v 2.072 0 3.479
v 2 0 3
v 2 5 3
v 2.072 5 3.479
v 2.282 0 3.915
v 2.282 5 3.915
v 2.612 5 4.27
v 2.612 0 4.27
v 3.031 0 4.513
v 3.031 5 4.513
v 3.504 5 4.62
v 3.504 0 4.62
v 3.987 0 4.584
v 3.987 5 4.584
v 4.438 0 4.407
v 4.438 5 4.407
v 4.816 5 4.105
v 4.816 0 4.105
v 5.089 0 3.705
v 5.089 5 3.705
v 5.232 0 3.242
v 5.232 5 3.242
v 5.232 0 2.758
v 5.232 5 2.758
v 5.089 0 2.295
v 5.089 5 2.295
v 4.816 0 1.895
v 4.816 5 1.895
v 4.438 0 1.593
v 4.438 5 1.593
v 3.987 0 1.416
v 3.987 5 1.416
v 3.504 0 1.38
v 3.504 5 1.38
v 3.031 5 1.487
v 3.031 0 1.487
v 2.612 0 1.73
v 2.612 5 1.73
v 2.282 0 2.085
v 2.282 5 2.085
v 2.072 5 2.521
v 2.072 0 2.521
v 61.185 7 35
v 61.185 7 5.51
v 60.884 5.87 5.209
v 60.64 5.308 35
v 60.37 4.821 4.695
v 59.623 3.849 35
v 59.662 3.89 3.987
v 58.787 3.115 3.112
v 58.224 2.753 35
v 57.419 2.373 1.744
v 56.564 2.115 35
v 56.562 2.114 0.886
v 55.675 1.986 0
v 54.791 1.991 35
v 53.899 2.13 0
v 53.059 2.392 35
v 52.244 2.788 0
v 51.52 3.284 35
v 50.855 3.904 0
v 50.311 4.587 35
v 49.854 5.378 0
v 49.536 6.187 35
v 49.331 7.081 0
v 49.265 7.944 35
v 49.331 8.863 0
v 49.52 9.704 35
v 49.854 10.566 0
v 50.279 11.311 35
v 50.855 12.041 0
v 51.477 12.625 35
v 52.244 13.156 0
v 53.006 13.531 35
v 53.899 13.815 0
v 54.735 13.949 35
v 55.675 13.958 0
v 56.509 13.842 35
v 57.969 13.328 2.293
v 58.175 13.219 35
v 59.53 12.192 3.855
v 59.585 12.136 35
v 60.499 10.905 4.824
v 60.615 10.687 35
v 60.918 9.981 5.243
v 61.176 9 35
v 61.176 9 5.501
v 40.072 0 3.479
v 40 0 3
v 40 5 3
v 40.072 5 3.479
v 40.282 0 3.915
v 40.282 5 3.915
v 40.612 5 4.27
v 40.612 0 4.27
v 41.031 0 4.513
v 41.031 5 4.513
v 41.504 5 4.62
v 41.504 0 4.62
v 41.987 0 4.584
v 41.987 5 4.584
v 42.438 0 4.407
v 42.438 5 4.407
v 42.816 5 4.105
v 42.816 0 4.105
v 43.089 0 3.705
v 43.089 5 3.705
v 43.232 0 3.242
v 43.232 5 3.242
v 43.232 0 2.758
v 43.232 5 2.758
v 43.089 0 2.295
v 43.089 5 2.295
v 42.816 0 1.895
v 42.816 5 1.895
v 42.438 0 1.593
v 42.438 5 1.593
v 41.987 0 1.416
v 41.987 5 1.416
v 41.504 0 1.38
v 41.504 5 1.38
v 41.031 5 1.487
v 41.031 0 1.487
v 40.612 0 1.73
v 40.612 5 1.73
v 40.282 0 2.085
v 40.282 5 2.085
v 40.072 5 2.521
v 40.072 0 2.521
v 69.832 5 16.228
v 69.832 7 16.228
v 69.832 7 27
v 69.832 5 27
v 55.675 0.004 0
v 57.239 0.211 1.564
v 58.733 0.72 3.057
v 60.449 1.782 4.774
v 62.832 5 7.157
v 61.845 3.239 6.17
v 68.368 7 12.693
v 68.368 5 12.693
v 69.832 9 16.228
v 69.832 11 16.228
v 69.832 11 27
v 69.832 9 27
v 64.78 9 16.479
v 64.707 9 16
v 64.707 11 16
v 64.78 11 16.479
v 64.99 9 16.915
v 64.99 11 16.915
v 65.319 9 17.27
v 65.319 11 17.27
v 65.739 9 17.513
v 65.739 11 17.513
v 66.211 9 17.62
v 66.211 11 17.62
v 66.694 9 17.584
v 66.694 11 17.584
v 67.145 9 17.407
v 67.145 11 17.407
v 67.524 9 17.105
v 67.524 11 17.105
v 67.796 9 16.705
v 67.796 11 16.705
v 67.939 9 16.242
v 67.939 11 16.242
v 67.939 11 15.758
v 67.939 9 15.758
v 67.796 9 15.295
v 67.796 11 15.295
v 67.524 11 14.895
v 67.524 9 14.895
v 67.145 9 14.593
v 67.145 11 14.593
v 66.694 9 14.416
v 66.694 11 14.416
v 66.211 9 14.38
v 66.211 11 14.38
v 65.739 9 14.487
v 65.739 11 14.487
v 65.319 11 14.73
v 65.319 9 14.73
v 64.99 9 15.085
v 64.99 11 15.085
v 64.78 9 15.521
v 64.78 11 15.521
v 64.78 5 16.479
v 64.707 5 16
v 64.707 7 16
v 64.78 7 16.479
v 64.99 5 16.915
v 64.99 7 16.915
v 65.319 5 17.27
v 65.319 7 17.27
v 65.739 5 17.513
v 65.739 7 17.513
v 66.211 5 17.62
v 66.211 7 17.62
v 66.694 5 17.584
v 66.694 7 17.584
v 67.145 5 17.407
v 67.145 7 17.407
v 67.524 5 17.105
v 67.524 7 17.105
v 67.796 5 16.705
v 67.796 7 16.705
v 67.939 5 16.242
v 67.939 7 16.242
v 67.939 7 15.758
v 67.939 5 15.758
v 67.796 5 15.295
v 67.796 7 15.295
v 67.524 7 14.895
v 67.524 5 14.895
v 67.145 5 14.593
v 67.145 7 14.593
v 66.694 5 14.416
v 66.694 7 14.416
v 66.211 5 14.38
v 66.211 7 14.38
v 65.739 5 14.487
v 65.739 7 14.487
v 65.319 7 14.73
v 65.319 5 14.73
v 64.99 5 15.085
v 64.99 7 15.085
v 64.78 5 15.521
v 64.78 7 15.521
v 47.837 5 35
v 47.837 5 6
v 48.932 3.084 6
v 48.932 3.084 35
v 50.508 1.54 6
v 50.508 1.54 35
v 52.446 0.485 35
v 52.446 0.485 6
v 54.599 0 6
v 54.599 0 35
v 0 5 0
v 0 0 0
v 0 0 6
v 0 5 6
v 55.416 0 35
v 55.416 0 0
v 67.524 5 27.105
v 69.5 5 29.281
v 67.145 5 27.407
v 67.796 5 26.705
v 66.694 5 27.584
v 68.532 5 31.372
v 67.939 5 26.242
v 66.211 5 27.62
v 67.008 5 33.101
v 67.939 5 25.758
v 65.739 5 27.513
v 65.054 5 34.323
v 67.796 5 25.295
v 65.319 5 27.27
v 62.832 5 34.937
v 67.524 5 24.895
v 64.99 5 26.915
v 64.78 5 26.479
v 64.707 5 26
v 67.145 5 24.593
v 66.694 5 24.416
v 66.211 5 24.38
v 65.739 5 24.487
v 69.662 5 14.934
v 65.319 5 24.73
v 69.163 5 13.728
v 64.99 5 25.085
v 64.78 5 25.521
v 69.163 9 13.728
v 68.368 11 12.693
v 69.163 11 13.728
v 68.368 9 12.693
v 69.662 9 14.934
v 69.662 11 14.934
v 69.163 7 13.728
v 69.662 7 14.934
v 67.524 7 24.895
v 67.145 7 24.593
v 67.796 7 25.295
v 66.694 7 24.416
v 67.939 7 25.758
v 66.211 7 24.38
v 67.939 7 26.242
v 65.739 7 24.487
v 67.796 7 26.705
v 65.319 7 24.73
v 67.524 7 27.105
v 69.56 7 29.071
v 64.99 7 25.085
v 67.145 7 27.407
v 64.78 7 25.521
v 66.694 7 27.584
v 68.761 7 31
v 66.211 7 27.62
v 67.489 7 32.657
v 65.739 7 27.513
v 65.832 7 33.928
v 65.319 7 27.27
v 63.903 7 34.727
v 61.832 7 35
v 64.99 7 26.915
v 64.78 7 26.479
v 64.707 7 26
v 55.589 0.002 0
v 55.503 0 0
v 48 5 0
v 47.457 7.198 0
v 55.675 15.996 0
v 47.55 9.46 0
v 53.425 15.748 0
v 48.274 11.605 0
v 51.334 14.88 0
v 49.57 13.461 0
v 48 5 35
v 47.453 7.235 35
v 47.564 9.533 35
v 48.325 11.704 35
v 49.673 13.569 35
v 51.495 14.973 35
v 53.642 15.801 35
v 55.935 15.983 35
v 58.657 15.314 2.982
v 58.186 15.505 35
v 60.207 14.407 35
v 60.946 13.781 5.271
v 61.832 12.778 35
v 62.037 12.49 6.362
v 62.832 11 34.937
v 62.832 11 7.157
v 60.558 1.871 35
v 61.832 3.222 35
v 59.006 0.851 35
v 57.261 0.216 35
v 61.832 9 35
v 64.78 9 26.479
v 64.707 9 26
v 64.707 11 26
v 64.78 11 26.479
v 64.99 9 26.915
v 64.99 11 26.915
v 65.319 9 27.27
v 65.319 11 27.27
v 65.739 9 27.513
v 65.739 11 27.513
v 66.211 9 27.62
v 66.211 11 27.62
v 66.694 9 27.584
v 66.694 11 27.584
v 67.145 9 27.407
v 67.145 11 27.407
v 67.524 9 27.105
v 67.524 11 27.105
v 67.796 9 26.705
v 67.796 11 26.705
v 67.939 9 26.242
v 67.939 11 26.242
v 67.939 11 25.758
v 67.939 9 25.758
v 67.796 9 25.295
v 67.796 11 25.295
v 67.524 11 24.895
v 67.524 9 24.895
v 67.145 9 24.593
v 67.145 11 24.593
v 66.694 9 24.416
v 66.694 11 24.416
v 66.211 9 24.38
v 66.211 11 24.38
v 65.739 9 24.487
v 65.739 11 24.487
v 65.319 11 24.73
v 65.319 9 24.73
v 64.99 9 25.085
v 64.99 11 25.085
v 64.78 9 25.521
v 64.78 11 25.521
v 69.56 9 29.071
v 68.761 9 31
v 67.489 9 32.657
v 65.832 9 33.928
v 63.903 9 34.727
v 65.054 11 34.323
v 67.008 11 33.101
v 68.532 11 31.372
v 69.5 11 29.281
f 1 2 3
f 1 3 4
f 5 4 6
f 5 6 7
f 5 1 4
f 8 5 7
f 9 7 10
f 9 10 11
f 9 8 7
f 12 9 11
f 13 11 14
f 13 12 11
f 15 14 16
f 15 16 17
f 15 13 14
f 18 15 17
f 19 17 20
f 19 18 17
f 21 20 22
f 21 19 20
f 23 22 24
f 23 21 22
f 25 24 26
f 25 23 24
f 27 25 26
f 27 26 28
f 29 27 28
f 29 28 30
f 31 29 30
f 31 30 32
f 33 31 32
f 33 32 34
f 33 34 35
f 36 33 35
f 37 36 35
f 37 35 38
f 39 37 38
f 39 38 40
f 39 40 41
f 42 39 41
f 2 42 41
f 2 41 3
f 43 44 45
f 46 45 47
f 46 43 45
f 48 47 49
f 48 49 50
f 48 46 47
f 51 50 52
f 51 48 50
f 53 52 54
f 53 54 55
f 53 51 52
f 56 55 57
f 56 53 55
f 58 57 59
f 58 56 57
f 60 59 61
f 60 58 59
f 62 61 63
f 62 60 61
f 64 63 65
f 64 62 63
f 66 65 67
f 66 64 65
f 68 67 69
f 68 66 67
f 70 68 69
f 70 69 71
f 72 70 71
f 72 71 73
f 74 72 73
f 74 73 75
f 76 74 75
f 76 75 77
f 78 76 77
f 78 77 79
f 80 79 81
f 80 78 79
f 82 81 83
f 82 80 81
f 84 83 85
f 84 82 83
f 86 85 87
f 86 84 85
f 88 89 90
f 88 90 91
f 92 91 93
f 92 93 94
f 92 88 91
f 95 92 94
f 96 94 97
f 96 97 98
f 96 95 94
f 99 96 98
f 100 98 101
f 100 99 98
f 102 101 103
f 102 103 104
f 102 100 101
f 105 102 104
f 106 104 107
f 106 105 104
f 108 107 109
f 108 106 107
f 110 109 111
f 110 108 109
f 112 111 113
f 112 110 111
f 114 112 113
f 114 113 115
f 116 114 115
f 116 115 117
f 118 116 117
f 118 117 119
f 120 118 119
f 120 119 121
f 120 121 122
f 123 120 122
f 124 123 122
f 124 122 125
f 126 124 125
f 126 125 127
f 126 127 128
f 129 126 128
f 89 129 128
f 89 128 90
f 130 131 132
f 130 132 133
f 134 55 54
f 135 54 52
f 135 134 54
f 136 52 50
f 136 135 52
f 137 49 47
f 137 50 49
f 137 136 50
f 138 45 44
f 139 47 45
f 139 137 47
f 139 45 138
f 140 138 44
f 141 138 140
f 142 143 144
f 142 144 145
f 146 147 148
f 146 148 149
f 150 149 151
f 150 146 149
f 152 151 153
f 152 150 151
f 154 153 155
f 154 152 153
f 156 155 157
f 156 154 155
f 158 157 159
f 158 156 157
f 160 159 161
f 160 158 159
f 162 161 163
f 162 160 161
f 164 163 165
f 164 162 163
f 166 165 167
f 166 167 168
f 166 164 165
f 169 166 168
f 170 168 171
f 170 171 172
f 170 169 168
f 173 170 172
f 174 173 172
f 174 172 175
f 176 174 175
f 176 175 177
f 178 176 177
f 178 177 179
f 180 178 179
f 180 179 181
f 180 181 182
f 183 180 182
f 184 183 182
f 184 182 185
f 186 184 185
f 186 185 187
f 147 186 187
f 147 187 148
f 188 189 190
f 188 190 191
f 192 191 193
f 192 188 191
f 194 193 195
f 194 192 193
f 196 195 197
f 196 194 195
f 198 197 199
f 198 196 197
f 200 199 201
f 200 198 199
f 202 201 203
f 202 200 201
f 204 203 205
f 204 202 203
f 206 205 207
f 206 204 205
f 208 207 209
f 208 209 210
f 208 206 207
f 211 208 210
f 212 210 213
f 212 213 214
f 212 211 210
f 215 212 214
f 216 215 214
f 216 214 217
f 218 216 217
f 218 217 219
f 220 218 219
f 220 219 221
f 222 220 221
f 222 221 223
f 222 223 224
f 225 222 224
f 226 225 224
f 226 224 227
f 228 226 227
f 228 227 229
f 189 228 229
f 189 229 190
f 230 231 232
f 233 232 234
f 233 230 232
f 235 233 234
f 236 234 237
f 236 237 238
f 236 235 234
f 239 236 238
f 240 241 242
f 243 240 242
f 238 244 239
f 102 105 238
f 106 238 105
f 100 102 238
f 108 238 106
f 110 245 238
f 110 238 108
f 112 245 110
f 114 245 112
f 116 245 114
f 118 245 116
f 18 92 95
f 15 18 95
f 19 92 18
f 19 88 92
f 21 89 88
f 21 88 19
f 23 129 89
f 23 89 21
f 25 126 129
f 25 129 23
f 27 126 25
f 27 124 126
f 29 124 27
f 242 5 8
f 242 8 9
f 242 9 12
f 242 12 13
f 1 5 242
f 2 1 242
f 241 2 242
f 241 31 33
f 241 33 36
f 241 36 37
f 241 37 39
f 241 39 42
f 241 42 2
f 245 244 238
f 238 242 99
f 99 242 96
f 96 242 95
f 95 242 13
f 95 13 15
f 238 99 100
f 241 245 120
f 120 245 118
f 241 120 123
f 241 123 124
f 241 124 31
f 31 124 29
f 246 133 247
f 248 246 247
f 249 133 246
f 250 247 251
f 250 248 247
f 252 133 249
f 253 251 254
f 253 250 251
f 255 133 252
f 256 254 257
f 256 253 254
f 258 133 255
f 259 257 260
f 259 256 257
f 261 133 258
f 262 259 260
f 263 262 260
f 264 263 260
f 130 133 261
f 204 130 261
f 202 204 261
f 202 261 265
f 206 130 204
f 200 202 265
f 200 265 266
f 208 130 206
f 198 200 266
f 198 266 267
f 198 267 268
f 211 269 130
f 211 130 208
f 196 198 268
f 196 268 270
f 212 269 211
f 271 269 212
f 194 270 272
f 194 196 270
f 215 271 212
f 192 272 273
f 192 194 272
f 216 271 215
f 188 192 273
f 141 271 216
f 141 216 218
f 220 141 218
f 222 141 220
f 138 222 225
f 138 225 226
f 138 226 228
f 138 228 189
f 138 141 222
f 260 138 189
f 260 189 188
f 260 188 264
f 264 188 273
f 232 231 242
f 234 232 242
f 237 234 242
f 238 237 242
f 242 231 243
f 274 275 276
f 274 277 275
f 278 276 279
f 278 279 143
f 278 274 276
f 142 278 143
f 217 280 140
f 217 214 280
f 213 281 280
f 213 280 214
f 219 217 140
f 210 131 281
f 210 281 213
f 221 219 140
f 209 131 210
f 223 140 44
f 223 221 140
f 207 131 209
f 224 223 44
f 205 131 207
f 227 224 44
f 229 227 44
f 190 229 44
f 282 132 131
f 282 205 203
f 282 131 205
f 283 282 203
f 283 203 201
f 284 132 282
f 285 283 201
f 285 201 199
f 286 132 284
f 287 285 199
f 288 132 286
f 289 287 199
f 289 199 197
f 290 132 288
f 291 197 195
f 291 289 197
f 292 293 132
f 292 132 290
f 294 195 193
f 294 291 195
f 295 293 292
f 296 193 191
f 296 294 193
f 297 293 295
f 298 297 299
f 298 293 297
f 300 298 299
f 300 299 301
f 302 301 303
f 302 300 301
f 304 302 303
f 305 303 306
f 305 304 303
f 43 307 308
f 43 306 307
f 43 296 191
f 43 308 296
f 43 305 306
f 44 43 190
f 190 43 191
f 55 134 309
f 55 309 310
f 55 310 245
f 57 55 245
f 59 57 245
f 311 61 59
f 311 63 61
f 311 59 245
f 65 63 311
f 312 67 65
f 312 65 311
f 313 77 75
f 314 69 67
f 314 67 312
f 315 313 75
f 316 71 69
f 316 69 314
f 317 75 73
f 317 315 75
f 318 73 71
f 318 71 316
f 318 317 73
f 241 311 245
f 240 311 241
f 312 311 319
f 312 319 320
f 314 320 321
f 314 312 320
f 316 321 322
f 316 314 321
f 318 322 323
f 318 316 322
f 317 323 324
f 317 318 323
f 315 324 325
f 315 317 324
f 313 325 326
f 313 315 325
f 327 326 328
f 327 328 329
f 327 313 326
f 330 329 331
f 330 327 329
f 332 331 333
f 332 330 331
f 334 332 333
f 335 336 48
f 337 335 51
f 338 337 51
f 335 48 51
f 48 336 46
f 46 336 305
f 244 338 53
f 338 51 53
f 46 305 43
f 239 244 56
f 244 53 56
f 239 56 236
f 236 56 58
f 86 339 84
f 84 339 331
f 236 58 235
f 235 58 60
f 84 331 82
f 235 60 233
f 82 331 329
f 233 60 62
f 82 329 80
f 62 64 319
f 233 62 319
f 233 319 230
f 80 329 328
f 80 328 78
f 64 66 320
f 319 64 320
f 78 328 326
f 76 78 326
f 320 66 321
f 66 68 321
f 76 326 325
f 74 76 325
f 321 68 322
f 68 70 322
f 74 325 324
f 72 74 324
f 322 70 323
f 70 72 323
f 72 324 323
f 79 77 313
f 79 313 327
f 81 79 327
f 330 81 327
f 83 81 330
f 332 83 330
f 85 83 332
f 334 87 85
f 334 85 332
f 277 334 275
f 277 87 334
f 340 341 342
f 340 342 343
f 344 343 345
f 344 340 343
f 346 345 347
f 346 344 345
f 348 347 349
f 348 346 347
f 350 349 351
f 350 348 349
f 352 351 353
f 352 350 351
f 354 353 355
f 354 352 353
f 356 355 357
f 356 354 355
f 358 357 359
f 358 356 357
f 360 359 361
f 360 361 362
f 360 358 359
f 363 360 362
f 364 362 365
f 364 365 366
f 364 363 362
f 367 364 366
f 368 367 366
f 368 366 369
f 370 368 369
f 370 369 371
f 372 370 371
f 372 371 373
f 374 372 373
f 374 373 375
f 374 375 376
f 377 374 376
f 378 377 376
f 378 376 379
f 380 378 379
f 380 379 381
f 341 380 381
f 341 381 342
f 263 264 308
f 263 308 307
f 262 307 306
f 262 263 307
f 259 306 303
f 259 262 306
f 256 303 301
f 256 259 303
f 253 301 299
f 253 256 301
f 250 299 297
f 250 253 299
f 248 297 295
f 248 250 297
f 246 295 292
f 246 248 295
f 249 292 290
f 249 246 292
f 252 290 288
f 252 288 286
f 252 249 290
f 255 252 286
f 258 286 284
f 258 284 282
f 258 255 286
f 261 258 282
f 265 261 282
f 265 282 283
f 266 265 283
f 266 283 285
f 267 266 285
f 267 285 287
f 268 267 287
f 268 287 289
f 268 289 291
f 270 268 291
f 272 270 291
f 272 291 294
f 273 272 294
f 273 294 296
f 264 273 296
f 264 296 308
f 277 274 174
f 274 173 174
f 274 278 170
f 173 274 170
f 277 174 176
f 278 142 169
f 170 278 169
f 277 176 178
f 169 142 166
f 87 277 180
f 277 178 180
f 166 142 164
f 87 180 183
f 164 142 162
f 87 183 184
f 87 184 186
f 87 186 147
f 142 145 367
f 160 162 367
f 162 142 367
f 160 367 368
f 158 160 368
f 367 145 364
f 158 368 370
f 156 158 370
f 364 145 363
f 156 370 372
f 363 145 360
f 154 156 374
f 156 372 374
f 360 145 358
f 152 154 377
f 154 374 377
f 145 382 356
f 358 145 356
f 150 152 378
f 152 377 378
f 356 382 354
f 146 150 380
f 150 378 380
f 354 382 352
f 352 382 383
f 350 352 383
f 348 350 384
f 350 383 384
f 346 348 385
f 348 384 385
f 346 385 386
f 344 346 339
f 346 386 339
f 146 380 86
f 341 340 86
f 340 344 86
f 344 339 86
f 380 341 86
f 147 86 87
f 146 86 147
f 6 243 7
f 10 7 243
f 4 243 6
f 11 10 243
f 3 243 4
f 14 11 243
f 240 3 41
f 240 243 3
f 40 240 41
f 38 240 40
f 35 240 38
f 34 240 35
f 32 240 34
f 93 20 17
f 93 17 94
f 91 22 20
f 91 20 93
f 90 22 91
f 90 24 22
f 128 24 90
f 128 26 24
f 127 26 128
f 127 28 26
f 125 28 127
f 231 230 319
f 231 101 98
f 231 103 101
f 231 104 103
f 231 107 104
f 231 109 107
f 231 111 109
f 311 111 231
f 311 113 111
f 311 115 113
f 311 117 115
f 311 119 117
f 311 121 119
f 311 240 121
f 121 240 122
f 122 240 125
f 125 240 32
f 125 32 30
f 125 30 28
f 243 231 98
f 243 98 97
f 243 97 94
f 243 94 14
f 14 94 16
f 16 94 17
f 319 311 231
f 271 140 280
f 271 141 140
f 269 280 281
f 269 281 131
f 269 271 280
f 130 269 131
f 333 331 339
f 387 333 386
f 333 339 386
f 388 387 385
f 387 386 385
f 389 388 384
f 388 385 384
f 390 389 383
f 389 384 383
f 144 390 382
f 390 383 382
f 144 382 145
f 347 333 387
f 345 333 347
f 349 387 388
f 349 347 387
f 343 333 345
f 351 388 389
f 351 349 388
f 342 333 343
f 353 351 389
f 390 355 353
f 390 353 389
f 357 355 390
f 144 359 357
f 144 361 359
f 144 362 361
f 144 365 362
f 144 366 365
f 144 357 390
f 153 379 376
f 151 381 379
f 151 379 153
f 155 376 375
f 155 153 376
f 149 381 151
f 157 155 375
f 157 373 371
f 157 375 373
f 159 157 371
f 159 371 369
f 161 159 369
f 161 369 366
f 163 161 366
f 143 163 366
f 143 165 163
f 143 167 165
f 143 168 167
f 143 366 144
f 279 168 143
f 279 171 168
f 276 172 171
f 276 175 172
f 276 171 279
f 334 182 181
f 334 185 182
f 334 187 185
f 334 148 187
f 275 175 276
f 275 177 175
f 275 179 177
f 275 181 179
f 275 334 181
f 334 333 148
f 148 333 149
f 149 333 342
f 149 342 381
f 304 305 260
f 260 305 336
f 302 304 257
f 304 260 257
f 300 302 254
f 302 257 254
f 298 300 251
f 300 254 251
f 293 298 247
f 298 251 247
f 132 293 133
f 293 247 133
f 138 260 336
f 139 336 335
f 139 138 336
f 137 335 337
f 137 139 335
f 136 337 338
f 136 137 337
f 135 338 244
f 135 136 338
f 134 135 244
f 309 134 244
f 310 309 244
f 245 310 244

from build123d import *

# Parameters (mm, degrees)
F1_DEPTH  = 35
F4_DEPTH  = 29
F5_R      = 6
F6_DEPTH  = 40
F7_W      = 12.2776310586
F7_H      = 2
F8_DEPTH  = 40
F10_DEPTH = 25
F11_R     = 8
F12_R     = 1.625
F12_R_2   = 1.6250003413
F13_DEPTH = 25
F15_W     = 74.6117010713
F15_H     = 42.9684482515
F16_DEPTH = 25
F17_R     = 5


with BuildPart() as f1:
    # F0 (on Top) → F1 (new body)
    with BuildSketch(Plane.XY):
        with BuildLine():
            Line((-48, 0), (0, 0))
            Line((0, 0), (0, 5))
            Line((0, 5), (-48, 5))
            ThreePointArc((-48, 5), (-52.4161984871, 15.4161984871), (-62.8323969742, 11))
            Line((-62.8323969742, 11), (-69.8323969742, 11))
            Line((-69.8323969742, 11), (-69.8323969742, 5))
            Line((-69.8323969742, 5), (-62.8323969742, 5))
            ThreePointArc((-62.8323969742, 5), (-59.8883344421, 1.3667504193), (-55.4161984871, 0))
            Line((-55.4161984871, 0), (-48, 0))
        make_face()
    extrude(amount=F1_DEPTH)

    # F3 (on offset) → F4 (cut)
    with BuildSketch(Plane.XY.offset(35)):
        with BuildLine():
            Line((-56, 0), (-55.9299111582, 0))
            ThreePointArc((-55.9299111582, 0), (-55.9649623523, 0.0030034406), (-56, 0.0061609878))
            Line((-56, 0.0061609878), (-56, 0))
        make_face()
        with BuildLine():
            ThreePointArc((-55.9299111582, 0), (-55.2644431591, -0.0277260244), (-54.59897516, 0))
            Line((-54.59897516, 0), (-55.9299111582, 0))
        make_face()
        with BuildLine():
            Line((-54.59897516, 0), (0, 0))
            Line((0, 0), (0, 5))
            Line((0, 5), (-47.8370891609, 5))
            ThreePointArc((-47.8370891609, 5), (-50.5080325408, 1.5398127025), (-54.59897516, 0))
        make_face()
    extrude(amount=-F4_DEPTH, mode=Mode.SUBTRACT)

    # F5 (on face) → F6 (cut)
    with BuildSketch(Plane.XY.offset(35)):
        with Locations((-55.2644431591, 7.9722739756)):
            Circle(F5_R)
    extrude(amount=-F6_DEPTH, mode=Mode.SUBTRACT)

    # F7 (on offset) → F8 (cut)
    with BuildSketch(Plane.XY.offset(35)):
        with Locations((-64.1601290554, 8)):
            Rectangle(F7_W, F7_H)
    extrude(amount=-F8_DEPTH, mode=Mode.SUBTRACT)

    # F9 (on Front) → F10 (cut)
    with BuildSketch(Plane.XZ):
        Polygon((-74.45092788, 0), (-55.6752420962, 0), (-74.45092788, 18.7756857838), align=None)
    extrude(amount=-F10_DEPTH, mode=Mode.SUBTRACT)

    # F11
    f11_edges = [f1.edges().sort_by_distance(p)[0] for p in [
        (-69.832397, 6, 35),
        (-69.832397, 10, 35),
    ]]
    fillet(f11_edges, radius=F11_R)

    # F12 (on Front) → F13 (cut)
    with BuildSketch(Plane.XZ):
        with Locations((-3.625, 3)):
            Circle(F12_R)
        with Locations((-41.625, 3)):
            Circle(F12_R)
        with Locations((-66.3323969742, 16)):
            Circle(F12_R_2)
        with Locations((-66.3323969742, 26)):
            Circle(F12_R)
    extrude(amount=-F13_DEPTH, mode=Mode.SUBTRACT)

    # F14: F1 across plane


with BuildPart() as f1_1:
    add(f1.part)
    add(f1.part.mirror(Plane.YZ))

    # F15 (on Front) → F16 (cut)
    with BuildSketch(Plane.XZ):
        with Locations((-37.3058505356, 21.4842241257)):
            Rectangle(F15_W, F15_H)
    extrude(amount=-F16_DEPTH, mode=Mode.SUBTRACT)

    # F17
    f17_edges = [f1_1.edges().sort_by_distance(p)[0] for p in [
        (69.832397, 6, 14.157155),
        (69.832397, 10, 14.157155),
    ]]
    fillet(f17_edges, radius=F17_R)


solid = f1_1.part
